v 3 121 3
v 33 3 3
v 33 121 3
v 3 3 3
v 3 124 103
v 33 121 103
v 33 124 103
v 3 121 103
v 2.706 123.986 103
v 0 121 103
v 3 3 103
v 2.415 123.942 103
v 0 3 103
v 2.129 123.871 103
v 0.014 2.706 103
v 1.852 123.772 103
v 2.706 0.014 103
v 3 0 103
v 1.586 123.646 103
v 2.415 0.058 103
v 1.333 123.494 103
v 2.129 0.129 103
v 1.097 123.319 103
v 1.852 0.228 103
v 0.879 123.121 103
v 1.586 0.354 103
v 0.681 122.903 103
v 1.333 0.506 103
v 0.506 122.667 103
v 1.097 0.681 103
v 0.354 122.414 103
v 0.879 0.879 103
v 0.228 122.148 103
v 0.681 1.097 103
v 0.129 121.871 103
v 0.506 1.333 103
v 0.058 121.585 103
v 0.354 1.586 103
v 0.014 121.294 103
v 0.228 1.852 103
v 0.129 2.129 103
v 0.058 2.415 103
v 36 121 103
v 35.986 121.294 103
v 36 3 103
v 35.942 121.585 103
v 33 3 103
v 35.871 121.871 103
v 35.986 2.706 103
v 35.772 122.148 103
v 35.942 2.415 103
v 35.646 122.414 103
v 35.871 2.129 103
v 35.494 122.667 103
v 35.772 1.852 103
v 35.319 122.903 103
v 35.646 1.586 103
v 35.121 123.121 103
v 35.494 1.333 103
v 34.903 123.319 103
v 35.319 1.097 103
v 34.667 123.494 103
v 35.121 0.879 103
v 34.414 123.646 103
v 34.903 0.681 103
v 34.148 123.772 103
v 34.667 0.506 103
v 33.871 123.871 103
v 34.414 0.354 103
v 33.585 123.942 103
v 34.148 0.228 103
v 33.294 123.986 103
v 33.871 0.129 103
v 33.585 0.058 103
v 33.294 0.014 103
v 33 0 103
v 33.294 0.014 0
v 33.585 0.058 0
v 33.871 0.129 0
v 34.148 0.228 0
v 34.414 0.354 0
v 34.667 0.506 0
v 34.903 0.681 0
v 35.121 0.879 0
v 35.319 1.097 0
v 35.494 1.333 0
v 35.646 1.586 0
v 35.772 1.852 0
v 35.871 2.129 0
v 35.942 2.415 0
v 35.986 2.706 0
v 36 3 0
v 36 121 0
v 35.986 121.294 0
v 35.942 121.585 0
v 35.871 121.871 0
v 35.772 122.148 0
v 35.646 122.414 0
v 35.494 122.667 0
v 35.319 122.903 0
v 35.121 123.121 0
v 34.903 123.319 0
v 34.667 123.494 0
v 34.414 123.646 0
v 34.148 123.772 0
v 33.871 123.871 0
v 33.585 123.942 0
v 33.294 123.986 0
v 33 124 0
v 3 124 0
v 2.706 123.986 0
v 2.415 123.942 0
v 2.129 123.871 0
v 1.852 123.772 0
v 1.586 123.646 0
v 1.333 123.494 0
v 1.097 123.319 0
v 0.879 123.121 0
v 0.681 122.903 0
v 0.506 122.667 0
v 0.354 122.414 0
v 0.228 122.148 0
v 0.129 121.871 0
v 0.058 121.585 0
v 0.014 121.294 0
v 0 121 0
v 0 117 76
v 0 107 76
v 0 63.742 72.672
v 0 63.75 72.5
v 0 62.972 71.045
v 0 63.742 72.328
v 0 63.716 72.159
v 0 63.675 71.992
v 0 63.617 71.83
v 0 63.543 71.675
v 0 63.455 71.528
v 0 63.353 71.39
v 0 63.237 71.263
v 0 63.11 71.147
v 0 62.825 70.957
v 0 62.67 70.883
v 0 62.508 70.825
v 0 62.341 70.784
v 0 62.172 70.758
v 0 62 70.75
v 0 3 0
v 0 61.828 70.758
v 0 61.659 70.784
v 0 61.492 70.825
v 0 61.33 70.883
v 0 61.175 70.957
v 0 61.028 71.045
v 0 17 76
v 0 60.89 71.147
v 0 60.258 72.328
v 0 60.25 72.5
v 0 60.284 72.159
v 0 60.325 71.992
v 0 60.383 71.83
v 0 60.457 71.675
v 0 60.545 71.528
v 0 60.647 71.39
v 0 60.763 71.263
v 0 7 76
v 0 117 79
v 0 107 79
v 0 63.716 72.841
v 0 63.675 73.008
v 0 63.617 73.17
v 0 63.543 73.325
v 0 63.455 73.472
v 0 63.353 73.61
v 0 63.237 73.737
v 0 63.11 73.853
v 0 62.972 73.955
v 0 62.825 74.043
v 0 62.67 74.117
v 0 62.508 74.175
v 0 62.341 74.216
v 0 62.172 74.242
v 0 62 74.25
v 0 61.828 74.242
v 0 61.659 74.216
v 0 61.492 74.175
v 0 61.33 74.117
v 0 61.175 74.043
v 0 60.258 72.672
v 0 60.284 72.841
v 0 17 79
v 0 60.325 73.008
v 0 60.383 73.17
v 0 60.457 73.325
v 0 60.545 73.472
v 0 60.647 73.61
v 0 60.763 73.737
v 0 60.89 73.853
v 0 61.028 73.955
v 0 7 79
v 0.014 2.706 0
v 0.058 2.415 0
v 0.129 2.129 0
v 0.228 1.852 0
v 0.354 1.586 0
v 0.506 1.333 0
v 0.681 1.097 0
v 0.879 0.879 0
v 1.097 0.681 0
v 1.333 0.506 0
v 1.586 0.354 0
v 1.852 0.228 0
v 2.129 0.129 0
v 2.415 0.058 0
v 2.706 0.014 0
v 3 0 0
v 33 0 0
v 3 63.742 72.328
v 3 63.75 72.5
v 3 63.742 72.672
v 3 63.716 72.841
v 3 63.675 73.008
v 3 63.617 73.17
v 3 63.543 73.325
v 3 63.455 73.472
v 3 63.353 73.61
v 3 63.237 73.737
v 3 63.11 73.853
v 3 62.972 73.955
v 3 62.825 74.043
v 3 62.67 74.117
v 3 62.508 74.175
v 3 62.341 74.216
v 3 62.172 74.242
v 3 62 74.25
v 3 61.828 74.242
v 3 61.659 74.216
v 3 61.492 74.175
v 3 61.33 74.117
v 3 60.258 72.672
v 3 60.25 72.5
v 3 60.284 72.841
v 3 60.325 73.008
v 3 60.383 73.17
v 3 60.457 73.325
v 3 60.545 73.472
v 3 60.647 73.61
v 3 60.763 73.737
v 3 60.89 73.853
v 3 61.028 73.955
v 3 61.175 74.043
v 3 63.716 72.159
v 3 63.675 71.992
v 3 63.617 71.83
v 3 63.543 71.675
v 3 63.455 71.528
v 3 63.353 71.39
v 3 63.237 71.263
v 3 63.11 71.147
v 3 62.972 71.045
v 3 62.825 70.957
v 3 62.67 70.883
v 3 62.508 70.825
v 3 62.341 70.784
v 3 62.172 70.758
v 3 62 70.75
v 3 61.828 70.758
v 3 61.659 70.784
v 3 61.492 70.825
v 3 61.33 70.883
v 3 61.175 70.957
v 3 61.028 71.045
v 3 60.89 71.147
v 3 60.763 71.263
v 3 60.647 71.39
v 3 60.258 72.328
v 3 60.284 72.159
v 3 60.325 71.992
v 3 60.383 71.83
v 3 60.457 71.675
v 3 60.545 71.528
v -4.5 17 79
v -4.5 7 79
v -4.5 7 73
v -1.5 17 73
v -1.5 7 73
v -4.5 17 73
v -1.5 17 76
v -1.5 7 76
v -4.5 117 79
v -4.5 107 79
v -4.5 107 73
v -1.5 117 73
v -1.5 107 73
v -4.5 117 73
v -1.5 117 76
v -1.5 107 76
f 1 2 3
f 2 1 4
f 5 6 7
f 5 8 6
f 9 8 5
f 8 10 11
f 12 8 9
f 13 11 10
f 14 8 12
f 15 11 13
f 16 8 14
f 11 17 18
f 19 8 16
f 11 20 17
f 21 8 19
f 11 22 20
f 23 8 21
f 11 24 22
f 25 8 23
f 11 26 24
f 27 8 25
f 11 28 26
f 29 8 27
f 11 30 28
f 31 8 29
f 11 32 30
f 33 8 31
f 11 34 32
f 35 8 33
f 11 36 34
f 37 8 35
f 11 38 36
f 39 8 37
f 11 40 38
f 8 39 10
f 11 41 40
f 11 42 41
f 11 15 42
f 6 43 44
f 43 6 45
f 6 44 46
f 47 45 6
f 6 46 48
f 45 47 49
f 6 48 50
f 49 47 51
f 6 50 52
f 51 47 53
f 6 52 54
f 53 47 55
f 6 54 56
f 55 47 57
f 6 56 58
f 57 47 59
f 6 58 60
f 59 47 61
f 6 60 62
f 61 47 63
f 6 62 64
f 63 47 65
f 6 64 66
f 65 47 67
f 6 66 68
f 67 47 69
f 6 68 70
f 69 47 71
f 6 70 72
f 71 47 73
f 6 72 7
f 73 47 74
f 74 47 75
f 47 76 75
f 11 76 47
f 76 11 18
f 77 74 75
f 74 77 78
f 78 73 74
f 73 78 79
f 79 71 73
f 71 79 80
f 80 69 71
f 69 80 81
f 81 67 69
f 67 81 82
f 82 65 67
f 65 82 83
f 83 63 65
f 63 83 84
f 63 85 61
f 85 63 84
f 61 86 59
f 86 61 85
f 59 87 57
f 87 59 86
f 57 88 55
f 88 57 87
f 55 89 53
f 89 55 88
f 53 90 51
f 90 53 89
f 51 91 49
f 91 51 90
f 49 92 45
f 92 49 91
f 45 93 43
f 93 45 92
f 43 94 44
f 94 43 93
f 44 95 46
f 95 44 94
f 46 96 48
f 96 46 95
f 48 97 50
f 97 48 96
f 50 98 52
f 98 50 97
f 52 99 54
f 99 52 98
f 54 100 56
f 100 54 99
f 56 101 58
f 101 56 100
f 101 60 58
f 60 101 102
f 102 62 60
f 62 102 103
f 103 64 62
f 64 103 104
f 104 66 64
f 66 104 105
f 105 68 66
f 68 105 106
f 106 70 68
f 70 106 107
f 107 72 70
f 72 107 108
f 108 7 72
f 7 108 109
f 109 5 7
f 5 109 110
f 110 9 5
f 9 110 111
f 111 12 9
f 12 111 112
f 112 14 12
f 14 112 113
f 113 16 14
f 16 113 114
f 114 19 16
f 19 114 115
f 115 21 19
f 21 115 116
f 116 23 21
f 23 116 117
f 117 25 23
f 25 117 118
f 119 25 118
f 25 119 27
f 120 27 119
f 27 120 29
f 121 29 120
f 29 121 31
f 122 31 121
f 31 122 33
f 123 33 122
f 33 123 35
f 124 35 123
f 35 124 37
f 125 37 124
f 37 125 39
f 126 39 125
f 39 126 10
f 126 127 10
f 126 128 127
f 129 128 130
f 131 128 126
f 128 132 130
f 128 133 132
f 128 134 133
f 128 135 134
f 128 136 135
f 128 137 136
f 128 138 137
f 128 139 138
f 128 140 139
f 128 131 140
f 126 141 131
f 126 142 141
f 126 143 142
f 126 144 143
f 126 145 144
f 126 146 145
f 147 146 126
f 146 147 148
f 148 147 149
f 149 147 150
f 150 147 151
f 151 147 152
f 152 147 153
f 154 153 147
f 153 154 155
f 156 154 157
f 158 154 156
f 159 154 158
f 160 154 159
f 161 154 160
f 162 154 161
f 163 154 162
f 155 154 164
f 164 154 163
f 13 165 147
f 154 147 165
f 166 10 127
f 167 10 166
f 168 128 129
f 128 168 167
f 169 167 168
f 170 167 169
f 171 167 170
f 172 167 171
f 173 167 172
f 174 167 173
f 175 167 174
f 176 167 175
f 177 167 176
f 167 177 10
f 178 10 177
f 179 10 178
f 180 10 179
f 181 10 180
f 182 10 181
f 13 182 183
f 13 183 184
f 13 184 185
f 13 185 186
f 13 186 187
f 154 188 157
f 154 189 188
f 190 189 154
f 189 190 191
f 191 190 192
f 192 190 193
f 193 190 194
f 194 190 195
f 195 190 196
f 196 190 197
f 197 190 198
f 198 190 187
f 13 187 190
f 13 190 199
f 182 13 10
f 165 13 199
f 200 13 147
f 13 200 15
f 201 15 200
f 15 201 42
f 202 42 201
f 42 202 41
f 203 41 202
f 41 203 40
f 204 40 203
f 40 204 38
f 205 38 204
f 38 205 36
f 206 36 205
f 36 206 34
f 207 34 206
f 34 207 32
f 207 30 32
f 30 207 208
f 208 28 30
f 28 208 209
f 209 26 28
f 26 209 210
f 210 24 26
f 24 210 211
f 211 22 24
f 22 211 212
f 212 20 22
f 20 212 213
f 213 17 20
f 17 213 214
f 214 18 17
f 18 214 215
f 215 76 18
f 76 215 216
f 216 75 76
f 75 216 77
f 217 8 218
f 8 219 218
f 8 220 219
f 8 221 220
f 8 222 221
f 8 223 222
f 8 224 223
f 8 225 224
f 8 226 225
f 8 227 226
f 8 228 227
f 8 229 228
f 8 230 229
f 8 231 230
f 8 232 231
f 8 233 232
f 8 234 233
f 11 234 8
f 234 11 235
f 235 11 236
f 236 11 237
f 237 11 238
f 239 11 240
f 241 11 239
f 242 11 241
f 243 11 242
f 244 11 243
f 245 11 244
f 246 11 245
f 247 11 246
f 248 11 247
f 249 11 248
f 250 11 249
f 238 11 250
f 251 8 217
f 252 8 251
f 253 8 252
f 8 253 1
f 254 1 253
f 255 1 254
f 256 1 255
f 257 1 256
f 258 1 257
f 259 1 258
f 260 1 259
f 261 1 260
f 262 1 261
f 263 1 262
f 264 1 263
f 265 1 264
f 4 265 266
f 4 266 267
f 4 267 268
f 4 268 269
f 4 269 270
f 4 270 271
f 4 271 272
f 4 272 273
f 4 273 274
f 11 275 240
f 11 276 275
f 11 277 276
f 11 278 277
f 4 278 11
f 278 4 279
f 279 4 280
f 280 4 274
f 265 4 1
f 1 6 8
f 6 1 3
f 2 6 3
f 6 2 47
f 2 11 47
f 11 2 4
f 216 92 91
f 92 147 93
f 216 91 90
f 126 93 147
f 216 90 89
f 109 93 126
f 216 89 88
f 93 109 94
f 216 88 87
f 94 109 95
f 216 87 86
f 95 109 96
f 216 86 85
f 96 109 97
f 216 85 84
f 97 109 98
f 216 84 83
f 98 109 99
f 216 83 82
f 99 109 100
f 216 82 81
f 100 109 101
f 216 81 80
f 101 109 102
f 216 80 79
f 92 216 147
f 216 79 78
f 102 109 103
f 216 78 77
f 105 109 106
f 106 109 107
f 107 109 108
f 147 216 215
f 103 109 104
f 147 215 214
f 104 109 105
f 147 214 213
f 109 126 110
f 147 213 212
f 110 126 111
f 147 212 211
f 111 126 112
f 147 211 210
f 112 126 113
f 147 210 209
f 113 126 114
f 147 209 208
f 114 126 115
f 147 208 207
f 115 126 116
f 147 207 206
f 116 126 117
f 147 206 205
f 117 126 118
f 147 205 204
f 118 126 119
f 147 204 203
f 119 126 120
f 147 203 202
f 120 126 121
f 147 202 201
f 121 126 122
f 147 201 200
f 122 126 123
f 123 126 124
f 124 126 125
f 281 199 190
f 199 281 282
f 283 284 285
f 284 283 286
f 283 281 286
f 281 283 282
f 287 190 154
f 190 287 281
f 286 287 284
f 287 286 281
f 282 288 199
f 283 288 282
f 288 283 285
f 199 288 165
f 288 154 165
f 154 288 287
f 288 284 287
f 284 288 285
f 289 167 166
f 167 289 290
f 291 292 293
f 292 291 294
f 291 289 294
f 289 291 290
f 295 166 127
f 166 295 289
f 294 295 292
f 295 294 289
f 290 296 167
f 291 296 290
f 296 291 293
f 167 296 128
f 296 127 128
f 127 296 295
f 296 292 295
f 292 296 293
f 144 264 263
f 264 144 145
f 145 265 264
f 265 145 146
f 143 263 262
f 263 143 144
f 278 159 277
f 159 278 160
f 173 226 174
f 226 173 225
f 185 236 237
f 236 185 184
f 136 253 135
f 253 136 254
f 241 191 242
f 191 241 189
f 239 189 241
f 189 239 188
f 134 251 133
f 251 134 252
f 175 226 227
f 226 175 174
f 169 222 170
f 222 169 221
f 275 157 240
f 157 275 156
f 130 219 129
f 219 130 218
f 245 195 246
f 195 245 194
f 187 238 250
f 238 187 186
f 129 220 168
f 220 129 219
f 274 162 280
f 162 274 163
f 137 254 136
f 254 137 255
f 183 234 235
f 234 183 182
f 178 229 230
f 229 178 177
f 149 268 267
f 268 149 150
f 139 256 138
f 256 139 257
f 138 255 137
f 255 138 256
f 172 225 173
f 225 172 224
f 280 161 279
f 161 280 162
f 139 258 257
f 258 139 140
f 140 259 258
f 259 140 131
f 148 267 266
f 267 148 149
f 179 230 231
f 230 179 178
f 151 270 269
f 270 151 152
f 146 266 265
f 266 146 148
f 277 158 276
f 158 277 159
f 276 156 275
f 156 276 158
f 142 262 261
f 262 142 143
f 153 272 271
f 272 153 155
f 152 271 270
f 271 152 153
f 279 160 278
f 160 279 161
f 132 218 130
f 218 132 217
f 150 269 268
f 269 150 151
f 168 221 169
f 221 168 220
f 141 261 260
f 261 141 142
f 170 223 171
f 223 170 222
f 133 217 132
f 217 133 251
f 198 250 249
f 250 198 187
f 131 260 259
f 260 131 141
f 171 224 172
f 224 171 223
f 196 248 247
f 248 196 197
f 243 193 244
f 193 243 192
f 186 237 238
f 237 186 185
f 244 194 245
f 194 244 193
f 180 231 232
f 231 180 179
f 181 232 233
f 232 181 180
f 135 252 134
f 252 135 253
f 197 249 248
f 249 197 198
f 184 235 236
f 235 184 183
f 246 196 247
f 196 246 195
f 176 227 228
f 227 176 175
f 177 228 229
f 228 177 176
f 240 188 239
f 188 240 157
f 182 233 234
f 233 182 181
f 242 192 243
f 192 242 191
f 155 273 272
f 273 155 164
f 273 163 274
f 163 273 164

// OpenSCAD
// file: hardware.scad
function dHex(e2e) = e2e / sin(60);
function rHex(e2e) = dHex(e2e) / 2;

module Hex(e2e, h) {
  r = rHex(e2e);
  x = r * cos(30);
  y = r * sin(30);
  linear_extrude(h) {
    polygon([
      [ r,  0],
      [ y,  x],
      [-y,  x],
      [-r,  0],
      [-y, -x],
      [ y, -x],
    ]);
  }
}

function dThread(std) =
  std == "6-32" ? 4 :
  // If it's not found, it is metric already.
  // Add 1/2mm tolerance so it doesn't bind.
  std + 0.5;

function rThread(std) = dThread(std) / 2;

// Thread diameter
// Thread length
// Thread padding
// Head diameter
// Head length
// Head padding
module ScrewStraightHead(td, tl, tp, hd, hl, hp) {
  translate([0, 0, -tp]) cylinder(d = td, h = tl + tp);
  translate([0, 0,  tl]) cylinder(d = hd, h = hl + hp);
}

// Thread diameter
// Thread length
// Thread padding
// Head diameter
// Head length 1: Length of chamfer.
// Head length 2: Length of head above chamfer edge.
// Head padding
module ScrewChamferHead(td, tl, tp, hd, hl1, hl2, hp) {
  translate([0, 0, -tp      ]) cylinder(d  = td,          h = tl + tp);
  translate([0, 0,  tl      ]) cylinder(d1 = td, d2 = hd, h = hl1);
  translate([0, 0,  tl + hl1]) cylinder(d  = hd,          h = hl2 + hp);
}

// Must provide either
// screw_l && head_l && head_d
// screw_l && thread_l && head_d
// screw_l && head_l1 && head_l2 && head_d1 && head_d2
// screw_l && thread_l && head_d
// thread_l && head_l && head_d
// thread_l && head_l1 && head_l2 && head_d1 && head_d2
module Screw(
  std,
  screw_l = undef,
  thread_l = undef,
  thread_padding = 0,
  head_l = undef,
  head_d = undef,
  head_l1 = undef,
  head_l2 = undef,
  head_padding = 0,
) {
  if (head_l1 && head_l2) {
    ScrewChamferHead(
      dThread(std),
      thread_l ? thread_l : screw_l - head_l1 - head_l2,
      thread_padding,
      head_d,
      head_l1,
      head_l2,
      head_padding
    );
  } else {
    ScrewStraightHead(
      dThread(std),
      thread_l ? thread_l : screw_l - head_l,
      thread_padding,
      head_d,
      head_l,
      head_padding
    );
  }
}

module CaseScrew(thread_padding = 0, head_padding = 0) {
  Screw(
    "6-32",
    screw_l = 9,
    head_l = 3,
    head_d = 9
  );
}

module HillmanNut() {
  Hex(8, 3);
}

module HillmanScrew(thread_padding = 0, head_padding = 0) {
  Screw(
    "6-32",
    screw_l = 13.3,
    head_l1 = 2.5,
    head_l2 = 0.75,
    head_d = 6.5
  );
}
// main file
$fn = 64;

use <hardware.scad>

th        =    3;
window_th =    1.5;
window_w  =  124;
window_h  =   33;
flat_w    =  110;
hanger_l  = window_th + th;
hanger_w  =   10;
hanger_h  = th + th;
hanger_dy = (window_w - flat_w) / 2;
hole_dz   = -  3.5;
// Interior caddy dimensions
width     =  window_w - th - th;
length    =   30;
depth     =  100;

// Screw(3, screw_l = 11, head_l = 3, head_d = 5.5, head_padding = 5);
// Hex(5.5, 2.5);

module CaddyInnerProfile() {
  square([length, width]);
}

module CaddyOuterProfile() {
  offset(th) {
    CaddyInnerProfile();
  }
}

module CaddyProfile() {
  difference() {
    CaddyOuterProfile();
    CaddyInnerProfile();
  }
}

module Caddy() {
  translate([th, th]) {
    translate([0, 0, th])
      linear_extrude(depth)
        CaddyProfile();
    linear_extrude(th)
      CaddyOuterProfile();
  }

  translate([
    -hanger_l,
    hanger_dy,
    depth - window_h + hanger_h
  ])
    Hanger();

  translate([
    -hanger_l,
    window_w - hanger_w - hanger_dy,
    depth - window_h + hanger_h
  ])
    Hanger();
}

module Hanger() {
  difference() {
    cube([hanger_l, hanger_w, hanger_h]);
    translate([hanger_l - window_th, -1, -1])
      cube([window_th, hanger_w + 2, th + 1]);
  }
}


difference() {
  Caddy();

  translate([-1, window_w / 2, depth + th - window_h + hanger_h + hole_dz])
    rotate([0, 90, 0])
      Screw(3, screw_l = 11, head_l = 3, head_d = 5.5, head_padding = 5);
}
